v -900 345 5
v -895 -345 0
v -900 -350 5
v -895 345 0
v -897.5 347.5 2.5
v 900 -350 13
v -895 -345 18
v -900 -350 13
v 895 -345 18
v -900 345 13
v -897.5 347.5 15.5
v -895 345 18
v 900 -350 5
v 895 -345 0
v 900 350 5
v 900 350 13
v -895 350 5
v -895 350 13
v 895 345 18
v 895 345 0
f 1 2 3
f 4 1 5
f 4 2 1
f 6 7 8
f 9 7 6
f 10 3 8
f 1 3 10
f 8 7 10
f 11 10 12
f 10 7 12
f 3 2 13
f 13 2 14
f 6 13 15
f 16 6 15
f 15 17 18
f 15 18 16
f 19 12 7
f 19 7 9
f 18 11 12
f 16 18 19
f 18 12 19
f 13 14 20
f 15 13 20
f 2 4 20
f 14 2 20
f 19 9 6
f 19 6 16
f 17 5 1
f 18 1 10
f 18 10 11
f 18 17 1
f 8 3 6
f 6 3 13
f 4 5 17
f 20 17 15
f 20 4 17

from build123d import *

# Parameters (mm, degrees)
F0_W     = 1800
F0_H     = 700
F1_DEPTH = 18
F2_SIZE  = 5
F3_SIZE  = 5


with BuildPart() as f1:
    # F0 (on Top) → F1 (new body)
    with BuildSketch(Plane.XY):
        Rectangle(F0_W, F0_H)
    extrude(amount=F1_DEPTH)

    # F2
    f2_edges = [f1.edges().sort_by_distance(p)[0] for p in [
        (900, 0, 18),
        (0, 350, 18),
        (-900, 0, 18),
        (0, -350, 18),
        (900, 0, 0),
        (0, 350, 0),
        (-900, 0, 0),
        (0, -350, 0),
    ]]
    chamfer(f2_edges, length=F2_SIZE)

    # F3
    f3_edges = [f1.edges().sort_by_distance(p)[0] for p in [
        (-900, 350, 9),
    ]]
    chamfer(f3_edges, length=F3_SIZE)


solid = f1.part
